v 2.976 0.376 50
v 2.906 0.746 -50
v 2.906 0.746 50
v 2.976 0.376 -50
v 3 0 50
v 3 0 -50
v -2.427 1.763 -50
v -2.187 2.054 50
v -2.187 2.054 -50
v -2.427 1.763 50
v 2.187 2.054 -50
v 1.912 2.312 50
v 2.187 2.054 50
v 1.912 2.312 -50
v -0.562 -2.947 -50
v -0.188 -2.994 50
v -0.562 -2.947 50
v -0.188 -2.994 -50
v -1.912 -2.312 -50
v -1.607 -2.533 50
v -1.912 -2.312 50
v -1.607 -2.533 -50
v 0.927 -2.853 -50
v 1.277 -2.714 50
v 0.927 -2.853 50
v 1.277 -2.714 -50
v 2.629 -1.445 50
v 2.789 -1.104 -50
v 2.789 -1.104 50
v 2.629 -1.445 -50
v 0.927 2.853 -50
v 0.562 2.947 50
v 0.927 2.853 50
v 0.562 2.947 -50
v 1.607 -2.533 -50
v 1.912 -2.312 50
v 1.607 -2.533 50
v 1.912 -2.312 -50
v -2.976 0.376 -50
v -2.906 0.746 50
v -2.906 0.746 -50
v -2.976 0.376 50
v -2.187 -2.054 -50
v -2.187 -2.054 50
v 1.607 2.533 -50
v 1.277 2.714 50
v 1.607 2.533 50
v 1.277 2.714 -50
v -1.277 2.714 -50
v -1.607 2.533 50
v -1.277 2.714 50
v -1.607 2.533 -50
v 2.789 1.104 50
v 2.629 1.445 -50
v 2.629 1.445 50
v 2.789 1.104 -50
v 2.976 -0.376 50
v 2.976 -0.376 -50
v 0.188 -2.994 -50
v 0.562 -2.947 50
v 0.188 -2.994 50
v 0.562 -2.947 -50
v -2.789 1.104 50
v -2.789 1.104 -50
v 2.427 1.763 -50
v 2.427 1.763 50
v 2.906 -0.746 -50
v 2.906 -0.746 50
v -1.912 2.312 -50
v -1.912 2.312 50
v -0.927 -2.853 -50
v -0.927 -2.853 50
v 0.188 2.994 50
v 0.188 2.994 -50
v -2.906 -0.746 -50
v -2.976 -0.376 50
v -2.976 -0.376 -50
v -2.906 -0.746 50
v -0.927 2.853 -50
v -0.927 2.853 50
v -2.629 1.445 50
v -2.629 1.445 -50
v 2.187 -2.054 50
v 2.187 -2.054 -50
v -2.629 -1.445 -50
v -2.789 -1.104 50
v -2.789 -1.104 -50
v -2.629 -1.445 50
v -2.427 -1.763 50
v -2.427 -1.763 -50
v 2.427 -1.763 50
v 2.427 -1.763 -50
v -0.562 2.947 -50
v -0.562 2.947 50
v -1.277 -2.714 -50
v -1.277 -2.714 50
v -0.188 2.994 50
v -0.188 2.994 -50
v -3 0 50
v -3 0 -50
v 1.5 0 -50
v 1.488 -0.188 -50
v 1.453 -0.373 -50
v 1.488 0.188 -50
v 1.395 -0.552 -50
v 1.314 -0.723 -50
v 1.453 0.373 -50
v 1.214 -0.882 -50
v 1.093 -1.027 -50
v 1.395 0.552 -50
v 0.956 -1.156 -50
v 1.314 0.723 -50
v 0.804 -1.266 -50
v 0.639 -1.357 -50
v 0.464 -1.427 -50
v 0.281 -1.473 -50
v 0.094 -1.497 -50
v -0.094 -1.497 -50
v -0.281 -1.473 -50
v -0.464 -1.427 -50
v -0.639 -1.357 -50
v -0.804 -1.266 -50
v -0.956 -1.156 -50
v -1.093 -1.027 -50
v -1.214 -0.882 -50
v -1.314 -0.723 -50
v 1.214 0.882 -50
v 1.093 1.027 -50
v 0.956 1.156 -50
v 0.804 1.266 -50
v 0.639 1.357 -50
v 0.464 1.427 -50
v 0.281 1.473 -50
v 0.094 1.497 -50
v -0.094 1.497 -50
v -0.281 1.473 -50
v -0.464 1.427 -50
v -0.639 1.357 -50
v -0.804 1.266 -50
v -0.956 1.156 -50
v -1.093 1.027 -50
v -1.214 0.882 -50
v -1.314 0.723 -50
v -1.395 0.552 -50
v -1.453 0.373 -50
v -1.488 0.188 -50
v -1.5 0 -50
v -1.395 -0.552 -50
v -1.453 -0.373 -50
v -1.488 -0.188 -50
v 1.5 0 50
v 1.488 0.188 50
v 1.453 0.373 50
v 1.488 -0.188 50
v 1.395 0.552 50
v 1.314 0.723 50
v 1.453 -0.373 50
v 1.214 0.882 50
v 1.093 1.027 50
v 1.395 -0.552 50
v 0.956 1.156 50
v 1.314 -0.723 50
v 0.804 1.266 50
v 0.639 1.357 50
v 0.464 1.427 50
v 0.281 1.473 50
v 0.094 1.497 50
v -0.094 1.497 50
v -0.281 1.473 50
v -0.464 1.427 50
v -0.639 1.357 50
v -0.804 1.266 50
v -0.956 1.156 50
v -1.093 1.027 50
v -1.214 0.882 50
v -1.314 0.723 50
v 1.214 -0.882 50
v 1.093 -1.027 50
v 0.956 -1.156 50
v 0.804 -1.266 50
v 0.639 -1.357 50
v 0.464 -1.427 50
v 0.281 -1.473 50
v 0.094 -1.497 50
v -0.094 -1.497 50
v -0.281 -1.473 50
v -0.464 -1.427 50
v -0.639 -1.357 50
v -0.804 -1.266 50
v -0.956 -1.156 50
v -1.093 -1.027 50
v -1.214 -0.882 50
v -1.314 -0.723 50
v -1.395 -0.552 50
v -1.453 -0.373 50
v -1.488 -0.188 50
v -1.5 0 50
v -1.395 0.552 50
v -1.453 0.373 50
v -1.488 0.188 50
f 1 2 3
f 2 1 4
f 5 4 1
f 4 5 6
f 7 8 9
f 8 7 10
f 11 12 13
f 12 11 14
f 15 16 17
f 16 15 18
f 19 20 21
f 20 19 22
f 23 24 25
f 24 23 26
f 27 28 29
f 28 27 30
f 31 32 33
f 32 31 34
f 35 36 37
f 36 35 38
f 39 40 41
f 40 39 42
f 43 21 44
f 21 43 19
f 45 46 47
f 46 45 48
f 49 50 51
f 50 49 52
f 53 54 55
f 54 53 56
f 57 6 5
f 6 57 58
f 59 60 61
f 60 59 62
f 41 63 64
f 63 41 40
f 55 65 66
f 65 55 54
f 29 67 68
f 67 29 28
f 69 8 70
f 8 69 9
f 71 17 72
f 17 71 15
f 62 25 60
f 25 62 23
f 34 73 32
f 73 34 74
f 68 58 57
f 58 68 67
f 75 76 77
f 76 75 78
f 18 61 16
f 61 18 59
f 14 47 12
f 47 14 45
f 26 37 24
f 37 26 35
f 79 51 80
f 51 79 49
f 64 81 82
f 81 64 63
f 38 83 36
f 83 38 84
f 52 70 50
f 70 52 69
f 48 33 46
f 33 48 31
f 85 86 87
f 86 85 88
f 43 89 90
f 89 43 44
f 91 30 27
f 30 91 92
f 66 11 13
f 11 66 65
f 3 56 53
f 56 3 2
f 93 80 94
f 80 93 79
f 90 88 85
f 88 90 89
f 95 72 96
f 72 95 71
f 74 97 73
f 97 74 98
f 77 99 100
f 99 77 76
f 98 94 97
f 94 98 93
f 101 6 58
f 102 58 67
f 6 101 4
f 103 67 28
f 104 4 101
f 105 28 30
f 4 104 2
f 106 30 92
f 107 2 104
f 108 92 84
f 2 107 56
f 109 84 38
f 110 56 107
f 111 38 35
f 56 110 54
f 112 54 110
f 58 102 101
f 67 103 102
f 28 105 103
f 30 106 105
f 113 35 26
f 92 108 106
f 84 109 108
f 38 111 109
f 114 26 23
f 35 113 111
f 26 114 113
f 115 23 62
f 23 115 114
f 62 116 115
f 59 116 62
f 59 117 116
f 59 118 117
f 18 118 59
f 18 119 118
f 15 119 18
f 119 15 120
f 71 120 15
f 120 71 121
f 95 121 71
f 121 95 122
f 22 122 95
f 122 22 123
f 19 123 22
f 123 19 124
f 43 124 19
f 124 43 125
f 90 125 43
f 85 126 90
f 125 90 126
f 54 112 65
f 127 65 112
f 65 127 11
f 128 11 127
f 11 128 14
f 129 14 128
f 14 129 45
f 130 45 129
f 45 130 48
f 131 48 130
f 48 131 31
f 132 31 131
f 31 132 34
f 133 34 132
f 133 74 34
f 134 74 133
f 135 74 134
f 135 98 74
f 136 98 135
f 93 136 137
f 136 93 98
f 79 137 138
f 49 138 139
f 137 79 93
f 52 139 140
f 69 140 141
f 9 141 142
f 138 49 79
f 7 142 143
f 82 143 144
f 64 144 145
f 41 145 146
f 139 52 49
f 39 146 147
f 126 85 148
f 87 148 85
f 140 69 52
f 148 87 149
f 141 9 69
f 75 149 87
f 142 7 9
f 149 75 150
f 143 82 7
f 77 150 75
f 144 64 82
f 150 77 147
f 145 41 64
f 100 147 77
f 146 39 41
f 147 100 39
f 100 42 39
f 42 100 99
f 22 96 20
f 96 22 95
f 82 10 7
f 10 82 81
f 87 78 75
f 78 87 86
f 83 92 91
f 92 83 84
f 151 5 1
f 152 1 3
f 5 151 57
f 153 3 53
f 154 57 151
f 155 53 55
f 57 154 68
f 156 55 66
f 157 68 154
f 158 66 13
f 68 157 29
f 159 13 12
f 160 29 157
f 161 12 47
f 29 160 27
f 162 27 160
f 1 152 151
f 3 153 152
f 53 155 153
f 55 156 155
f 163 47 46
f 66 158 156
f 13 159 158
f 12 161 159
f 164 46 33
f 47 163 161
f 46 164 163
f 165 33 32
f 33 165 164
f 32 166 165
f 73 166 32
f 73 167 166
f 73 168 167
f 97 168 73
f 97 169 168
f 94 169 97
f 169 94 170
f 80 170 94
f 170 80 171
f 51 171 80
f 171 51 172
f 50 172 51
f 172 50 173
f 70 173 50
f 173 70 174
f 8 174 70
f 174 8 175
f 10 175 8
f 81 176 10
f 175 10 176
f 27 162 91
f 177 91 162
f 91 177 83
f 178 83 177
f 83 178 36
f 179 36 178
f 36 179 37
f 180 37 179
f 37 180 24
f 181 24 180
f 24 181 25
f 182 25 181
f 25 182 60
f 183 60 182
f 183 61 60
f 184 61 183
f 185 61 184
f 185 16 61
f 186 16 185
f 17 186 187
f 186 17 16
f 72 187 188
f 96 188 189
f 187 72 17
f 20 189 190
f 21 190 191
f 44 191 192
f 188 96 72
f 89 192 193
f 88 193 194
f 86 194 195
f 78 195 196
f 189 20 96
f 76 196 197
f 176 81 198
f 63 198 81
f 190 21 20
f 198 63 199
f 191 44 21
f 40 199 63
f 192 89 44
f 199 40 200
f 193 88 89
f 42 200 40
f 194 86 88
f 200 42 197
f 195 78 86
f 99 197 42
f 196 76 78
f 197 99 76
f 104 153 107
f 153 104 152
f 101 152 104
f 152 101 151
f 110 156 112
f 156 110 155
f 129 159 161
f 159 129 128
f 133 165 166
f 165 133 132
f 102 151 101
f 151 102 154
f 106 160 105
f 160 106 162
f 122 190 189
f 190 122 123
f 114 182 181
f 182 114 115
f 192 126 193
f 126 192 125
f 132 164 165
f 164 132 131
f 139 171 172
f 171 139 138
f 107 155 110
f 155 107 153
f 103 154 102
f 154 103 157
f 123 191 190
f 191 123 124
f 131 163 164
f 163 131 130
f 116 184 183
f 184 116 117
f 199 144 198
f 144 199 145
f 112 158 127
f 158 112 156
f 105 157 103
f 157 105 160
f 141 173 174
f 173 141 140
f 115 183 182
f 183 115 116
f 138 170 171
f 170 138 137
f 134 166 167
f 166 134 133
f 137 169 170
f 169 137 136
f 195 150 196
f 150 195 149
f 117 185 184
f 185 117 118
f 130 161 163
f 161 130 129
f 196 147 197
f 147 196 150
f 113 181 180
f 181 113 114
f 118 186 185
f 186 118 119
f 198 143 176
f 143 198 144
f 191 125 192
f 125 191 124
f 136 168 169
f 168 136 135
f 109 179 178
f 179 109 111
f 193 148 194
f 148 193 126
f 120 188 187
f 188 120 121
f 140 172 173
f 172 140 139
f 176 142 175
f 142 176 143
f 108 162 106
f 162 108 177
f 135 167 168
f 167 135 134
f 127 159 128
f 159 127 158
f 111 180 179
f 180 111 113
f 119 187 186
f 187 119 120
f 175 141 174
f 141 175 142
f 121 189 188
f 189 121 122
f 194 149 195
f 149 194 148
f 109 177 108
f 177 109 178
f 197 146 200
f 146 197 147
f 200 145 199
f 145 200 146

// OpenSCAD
$fn = 50;


difference() {
	union() {
		translate(v = [0, 0, -50.0000000000]) {
			cylinder(h = 100, r = 3.0000000000);
		}
	}
	union() {
		translate(v = [0, 0, -100.0000000000]) {
			cylinder(h = 200, r = 1.5000000000);
		}
	}
}
